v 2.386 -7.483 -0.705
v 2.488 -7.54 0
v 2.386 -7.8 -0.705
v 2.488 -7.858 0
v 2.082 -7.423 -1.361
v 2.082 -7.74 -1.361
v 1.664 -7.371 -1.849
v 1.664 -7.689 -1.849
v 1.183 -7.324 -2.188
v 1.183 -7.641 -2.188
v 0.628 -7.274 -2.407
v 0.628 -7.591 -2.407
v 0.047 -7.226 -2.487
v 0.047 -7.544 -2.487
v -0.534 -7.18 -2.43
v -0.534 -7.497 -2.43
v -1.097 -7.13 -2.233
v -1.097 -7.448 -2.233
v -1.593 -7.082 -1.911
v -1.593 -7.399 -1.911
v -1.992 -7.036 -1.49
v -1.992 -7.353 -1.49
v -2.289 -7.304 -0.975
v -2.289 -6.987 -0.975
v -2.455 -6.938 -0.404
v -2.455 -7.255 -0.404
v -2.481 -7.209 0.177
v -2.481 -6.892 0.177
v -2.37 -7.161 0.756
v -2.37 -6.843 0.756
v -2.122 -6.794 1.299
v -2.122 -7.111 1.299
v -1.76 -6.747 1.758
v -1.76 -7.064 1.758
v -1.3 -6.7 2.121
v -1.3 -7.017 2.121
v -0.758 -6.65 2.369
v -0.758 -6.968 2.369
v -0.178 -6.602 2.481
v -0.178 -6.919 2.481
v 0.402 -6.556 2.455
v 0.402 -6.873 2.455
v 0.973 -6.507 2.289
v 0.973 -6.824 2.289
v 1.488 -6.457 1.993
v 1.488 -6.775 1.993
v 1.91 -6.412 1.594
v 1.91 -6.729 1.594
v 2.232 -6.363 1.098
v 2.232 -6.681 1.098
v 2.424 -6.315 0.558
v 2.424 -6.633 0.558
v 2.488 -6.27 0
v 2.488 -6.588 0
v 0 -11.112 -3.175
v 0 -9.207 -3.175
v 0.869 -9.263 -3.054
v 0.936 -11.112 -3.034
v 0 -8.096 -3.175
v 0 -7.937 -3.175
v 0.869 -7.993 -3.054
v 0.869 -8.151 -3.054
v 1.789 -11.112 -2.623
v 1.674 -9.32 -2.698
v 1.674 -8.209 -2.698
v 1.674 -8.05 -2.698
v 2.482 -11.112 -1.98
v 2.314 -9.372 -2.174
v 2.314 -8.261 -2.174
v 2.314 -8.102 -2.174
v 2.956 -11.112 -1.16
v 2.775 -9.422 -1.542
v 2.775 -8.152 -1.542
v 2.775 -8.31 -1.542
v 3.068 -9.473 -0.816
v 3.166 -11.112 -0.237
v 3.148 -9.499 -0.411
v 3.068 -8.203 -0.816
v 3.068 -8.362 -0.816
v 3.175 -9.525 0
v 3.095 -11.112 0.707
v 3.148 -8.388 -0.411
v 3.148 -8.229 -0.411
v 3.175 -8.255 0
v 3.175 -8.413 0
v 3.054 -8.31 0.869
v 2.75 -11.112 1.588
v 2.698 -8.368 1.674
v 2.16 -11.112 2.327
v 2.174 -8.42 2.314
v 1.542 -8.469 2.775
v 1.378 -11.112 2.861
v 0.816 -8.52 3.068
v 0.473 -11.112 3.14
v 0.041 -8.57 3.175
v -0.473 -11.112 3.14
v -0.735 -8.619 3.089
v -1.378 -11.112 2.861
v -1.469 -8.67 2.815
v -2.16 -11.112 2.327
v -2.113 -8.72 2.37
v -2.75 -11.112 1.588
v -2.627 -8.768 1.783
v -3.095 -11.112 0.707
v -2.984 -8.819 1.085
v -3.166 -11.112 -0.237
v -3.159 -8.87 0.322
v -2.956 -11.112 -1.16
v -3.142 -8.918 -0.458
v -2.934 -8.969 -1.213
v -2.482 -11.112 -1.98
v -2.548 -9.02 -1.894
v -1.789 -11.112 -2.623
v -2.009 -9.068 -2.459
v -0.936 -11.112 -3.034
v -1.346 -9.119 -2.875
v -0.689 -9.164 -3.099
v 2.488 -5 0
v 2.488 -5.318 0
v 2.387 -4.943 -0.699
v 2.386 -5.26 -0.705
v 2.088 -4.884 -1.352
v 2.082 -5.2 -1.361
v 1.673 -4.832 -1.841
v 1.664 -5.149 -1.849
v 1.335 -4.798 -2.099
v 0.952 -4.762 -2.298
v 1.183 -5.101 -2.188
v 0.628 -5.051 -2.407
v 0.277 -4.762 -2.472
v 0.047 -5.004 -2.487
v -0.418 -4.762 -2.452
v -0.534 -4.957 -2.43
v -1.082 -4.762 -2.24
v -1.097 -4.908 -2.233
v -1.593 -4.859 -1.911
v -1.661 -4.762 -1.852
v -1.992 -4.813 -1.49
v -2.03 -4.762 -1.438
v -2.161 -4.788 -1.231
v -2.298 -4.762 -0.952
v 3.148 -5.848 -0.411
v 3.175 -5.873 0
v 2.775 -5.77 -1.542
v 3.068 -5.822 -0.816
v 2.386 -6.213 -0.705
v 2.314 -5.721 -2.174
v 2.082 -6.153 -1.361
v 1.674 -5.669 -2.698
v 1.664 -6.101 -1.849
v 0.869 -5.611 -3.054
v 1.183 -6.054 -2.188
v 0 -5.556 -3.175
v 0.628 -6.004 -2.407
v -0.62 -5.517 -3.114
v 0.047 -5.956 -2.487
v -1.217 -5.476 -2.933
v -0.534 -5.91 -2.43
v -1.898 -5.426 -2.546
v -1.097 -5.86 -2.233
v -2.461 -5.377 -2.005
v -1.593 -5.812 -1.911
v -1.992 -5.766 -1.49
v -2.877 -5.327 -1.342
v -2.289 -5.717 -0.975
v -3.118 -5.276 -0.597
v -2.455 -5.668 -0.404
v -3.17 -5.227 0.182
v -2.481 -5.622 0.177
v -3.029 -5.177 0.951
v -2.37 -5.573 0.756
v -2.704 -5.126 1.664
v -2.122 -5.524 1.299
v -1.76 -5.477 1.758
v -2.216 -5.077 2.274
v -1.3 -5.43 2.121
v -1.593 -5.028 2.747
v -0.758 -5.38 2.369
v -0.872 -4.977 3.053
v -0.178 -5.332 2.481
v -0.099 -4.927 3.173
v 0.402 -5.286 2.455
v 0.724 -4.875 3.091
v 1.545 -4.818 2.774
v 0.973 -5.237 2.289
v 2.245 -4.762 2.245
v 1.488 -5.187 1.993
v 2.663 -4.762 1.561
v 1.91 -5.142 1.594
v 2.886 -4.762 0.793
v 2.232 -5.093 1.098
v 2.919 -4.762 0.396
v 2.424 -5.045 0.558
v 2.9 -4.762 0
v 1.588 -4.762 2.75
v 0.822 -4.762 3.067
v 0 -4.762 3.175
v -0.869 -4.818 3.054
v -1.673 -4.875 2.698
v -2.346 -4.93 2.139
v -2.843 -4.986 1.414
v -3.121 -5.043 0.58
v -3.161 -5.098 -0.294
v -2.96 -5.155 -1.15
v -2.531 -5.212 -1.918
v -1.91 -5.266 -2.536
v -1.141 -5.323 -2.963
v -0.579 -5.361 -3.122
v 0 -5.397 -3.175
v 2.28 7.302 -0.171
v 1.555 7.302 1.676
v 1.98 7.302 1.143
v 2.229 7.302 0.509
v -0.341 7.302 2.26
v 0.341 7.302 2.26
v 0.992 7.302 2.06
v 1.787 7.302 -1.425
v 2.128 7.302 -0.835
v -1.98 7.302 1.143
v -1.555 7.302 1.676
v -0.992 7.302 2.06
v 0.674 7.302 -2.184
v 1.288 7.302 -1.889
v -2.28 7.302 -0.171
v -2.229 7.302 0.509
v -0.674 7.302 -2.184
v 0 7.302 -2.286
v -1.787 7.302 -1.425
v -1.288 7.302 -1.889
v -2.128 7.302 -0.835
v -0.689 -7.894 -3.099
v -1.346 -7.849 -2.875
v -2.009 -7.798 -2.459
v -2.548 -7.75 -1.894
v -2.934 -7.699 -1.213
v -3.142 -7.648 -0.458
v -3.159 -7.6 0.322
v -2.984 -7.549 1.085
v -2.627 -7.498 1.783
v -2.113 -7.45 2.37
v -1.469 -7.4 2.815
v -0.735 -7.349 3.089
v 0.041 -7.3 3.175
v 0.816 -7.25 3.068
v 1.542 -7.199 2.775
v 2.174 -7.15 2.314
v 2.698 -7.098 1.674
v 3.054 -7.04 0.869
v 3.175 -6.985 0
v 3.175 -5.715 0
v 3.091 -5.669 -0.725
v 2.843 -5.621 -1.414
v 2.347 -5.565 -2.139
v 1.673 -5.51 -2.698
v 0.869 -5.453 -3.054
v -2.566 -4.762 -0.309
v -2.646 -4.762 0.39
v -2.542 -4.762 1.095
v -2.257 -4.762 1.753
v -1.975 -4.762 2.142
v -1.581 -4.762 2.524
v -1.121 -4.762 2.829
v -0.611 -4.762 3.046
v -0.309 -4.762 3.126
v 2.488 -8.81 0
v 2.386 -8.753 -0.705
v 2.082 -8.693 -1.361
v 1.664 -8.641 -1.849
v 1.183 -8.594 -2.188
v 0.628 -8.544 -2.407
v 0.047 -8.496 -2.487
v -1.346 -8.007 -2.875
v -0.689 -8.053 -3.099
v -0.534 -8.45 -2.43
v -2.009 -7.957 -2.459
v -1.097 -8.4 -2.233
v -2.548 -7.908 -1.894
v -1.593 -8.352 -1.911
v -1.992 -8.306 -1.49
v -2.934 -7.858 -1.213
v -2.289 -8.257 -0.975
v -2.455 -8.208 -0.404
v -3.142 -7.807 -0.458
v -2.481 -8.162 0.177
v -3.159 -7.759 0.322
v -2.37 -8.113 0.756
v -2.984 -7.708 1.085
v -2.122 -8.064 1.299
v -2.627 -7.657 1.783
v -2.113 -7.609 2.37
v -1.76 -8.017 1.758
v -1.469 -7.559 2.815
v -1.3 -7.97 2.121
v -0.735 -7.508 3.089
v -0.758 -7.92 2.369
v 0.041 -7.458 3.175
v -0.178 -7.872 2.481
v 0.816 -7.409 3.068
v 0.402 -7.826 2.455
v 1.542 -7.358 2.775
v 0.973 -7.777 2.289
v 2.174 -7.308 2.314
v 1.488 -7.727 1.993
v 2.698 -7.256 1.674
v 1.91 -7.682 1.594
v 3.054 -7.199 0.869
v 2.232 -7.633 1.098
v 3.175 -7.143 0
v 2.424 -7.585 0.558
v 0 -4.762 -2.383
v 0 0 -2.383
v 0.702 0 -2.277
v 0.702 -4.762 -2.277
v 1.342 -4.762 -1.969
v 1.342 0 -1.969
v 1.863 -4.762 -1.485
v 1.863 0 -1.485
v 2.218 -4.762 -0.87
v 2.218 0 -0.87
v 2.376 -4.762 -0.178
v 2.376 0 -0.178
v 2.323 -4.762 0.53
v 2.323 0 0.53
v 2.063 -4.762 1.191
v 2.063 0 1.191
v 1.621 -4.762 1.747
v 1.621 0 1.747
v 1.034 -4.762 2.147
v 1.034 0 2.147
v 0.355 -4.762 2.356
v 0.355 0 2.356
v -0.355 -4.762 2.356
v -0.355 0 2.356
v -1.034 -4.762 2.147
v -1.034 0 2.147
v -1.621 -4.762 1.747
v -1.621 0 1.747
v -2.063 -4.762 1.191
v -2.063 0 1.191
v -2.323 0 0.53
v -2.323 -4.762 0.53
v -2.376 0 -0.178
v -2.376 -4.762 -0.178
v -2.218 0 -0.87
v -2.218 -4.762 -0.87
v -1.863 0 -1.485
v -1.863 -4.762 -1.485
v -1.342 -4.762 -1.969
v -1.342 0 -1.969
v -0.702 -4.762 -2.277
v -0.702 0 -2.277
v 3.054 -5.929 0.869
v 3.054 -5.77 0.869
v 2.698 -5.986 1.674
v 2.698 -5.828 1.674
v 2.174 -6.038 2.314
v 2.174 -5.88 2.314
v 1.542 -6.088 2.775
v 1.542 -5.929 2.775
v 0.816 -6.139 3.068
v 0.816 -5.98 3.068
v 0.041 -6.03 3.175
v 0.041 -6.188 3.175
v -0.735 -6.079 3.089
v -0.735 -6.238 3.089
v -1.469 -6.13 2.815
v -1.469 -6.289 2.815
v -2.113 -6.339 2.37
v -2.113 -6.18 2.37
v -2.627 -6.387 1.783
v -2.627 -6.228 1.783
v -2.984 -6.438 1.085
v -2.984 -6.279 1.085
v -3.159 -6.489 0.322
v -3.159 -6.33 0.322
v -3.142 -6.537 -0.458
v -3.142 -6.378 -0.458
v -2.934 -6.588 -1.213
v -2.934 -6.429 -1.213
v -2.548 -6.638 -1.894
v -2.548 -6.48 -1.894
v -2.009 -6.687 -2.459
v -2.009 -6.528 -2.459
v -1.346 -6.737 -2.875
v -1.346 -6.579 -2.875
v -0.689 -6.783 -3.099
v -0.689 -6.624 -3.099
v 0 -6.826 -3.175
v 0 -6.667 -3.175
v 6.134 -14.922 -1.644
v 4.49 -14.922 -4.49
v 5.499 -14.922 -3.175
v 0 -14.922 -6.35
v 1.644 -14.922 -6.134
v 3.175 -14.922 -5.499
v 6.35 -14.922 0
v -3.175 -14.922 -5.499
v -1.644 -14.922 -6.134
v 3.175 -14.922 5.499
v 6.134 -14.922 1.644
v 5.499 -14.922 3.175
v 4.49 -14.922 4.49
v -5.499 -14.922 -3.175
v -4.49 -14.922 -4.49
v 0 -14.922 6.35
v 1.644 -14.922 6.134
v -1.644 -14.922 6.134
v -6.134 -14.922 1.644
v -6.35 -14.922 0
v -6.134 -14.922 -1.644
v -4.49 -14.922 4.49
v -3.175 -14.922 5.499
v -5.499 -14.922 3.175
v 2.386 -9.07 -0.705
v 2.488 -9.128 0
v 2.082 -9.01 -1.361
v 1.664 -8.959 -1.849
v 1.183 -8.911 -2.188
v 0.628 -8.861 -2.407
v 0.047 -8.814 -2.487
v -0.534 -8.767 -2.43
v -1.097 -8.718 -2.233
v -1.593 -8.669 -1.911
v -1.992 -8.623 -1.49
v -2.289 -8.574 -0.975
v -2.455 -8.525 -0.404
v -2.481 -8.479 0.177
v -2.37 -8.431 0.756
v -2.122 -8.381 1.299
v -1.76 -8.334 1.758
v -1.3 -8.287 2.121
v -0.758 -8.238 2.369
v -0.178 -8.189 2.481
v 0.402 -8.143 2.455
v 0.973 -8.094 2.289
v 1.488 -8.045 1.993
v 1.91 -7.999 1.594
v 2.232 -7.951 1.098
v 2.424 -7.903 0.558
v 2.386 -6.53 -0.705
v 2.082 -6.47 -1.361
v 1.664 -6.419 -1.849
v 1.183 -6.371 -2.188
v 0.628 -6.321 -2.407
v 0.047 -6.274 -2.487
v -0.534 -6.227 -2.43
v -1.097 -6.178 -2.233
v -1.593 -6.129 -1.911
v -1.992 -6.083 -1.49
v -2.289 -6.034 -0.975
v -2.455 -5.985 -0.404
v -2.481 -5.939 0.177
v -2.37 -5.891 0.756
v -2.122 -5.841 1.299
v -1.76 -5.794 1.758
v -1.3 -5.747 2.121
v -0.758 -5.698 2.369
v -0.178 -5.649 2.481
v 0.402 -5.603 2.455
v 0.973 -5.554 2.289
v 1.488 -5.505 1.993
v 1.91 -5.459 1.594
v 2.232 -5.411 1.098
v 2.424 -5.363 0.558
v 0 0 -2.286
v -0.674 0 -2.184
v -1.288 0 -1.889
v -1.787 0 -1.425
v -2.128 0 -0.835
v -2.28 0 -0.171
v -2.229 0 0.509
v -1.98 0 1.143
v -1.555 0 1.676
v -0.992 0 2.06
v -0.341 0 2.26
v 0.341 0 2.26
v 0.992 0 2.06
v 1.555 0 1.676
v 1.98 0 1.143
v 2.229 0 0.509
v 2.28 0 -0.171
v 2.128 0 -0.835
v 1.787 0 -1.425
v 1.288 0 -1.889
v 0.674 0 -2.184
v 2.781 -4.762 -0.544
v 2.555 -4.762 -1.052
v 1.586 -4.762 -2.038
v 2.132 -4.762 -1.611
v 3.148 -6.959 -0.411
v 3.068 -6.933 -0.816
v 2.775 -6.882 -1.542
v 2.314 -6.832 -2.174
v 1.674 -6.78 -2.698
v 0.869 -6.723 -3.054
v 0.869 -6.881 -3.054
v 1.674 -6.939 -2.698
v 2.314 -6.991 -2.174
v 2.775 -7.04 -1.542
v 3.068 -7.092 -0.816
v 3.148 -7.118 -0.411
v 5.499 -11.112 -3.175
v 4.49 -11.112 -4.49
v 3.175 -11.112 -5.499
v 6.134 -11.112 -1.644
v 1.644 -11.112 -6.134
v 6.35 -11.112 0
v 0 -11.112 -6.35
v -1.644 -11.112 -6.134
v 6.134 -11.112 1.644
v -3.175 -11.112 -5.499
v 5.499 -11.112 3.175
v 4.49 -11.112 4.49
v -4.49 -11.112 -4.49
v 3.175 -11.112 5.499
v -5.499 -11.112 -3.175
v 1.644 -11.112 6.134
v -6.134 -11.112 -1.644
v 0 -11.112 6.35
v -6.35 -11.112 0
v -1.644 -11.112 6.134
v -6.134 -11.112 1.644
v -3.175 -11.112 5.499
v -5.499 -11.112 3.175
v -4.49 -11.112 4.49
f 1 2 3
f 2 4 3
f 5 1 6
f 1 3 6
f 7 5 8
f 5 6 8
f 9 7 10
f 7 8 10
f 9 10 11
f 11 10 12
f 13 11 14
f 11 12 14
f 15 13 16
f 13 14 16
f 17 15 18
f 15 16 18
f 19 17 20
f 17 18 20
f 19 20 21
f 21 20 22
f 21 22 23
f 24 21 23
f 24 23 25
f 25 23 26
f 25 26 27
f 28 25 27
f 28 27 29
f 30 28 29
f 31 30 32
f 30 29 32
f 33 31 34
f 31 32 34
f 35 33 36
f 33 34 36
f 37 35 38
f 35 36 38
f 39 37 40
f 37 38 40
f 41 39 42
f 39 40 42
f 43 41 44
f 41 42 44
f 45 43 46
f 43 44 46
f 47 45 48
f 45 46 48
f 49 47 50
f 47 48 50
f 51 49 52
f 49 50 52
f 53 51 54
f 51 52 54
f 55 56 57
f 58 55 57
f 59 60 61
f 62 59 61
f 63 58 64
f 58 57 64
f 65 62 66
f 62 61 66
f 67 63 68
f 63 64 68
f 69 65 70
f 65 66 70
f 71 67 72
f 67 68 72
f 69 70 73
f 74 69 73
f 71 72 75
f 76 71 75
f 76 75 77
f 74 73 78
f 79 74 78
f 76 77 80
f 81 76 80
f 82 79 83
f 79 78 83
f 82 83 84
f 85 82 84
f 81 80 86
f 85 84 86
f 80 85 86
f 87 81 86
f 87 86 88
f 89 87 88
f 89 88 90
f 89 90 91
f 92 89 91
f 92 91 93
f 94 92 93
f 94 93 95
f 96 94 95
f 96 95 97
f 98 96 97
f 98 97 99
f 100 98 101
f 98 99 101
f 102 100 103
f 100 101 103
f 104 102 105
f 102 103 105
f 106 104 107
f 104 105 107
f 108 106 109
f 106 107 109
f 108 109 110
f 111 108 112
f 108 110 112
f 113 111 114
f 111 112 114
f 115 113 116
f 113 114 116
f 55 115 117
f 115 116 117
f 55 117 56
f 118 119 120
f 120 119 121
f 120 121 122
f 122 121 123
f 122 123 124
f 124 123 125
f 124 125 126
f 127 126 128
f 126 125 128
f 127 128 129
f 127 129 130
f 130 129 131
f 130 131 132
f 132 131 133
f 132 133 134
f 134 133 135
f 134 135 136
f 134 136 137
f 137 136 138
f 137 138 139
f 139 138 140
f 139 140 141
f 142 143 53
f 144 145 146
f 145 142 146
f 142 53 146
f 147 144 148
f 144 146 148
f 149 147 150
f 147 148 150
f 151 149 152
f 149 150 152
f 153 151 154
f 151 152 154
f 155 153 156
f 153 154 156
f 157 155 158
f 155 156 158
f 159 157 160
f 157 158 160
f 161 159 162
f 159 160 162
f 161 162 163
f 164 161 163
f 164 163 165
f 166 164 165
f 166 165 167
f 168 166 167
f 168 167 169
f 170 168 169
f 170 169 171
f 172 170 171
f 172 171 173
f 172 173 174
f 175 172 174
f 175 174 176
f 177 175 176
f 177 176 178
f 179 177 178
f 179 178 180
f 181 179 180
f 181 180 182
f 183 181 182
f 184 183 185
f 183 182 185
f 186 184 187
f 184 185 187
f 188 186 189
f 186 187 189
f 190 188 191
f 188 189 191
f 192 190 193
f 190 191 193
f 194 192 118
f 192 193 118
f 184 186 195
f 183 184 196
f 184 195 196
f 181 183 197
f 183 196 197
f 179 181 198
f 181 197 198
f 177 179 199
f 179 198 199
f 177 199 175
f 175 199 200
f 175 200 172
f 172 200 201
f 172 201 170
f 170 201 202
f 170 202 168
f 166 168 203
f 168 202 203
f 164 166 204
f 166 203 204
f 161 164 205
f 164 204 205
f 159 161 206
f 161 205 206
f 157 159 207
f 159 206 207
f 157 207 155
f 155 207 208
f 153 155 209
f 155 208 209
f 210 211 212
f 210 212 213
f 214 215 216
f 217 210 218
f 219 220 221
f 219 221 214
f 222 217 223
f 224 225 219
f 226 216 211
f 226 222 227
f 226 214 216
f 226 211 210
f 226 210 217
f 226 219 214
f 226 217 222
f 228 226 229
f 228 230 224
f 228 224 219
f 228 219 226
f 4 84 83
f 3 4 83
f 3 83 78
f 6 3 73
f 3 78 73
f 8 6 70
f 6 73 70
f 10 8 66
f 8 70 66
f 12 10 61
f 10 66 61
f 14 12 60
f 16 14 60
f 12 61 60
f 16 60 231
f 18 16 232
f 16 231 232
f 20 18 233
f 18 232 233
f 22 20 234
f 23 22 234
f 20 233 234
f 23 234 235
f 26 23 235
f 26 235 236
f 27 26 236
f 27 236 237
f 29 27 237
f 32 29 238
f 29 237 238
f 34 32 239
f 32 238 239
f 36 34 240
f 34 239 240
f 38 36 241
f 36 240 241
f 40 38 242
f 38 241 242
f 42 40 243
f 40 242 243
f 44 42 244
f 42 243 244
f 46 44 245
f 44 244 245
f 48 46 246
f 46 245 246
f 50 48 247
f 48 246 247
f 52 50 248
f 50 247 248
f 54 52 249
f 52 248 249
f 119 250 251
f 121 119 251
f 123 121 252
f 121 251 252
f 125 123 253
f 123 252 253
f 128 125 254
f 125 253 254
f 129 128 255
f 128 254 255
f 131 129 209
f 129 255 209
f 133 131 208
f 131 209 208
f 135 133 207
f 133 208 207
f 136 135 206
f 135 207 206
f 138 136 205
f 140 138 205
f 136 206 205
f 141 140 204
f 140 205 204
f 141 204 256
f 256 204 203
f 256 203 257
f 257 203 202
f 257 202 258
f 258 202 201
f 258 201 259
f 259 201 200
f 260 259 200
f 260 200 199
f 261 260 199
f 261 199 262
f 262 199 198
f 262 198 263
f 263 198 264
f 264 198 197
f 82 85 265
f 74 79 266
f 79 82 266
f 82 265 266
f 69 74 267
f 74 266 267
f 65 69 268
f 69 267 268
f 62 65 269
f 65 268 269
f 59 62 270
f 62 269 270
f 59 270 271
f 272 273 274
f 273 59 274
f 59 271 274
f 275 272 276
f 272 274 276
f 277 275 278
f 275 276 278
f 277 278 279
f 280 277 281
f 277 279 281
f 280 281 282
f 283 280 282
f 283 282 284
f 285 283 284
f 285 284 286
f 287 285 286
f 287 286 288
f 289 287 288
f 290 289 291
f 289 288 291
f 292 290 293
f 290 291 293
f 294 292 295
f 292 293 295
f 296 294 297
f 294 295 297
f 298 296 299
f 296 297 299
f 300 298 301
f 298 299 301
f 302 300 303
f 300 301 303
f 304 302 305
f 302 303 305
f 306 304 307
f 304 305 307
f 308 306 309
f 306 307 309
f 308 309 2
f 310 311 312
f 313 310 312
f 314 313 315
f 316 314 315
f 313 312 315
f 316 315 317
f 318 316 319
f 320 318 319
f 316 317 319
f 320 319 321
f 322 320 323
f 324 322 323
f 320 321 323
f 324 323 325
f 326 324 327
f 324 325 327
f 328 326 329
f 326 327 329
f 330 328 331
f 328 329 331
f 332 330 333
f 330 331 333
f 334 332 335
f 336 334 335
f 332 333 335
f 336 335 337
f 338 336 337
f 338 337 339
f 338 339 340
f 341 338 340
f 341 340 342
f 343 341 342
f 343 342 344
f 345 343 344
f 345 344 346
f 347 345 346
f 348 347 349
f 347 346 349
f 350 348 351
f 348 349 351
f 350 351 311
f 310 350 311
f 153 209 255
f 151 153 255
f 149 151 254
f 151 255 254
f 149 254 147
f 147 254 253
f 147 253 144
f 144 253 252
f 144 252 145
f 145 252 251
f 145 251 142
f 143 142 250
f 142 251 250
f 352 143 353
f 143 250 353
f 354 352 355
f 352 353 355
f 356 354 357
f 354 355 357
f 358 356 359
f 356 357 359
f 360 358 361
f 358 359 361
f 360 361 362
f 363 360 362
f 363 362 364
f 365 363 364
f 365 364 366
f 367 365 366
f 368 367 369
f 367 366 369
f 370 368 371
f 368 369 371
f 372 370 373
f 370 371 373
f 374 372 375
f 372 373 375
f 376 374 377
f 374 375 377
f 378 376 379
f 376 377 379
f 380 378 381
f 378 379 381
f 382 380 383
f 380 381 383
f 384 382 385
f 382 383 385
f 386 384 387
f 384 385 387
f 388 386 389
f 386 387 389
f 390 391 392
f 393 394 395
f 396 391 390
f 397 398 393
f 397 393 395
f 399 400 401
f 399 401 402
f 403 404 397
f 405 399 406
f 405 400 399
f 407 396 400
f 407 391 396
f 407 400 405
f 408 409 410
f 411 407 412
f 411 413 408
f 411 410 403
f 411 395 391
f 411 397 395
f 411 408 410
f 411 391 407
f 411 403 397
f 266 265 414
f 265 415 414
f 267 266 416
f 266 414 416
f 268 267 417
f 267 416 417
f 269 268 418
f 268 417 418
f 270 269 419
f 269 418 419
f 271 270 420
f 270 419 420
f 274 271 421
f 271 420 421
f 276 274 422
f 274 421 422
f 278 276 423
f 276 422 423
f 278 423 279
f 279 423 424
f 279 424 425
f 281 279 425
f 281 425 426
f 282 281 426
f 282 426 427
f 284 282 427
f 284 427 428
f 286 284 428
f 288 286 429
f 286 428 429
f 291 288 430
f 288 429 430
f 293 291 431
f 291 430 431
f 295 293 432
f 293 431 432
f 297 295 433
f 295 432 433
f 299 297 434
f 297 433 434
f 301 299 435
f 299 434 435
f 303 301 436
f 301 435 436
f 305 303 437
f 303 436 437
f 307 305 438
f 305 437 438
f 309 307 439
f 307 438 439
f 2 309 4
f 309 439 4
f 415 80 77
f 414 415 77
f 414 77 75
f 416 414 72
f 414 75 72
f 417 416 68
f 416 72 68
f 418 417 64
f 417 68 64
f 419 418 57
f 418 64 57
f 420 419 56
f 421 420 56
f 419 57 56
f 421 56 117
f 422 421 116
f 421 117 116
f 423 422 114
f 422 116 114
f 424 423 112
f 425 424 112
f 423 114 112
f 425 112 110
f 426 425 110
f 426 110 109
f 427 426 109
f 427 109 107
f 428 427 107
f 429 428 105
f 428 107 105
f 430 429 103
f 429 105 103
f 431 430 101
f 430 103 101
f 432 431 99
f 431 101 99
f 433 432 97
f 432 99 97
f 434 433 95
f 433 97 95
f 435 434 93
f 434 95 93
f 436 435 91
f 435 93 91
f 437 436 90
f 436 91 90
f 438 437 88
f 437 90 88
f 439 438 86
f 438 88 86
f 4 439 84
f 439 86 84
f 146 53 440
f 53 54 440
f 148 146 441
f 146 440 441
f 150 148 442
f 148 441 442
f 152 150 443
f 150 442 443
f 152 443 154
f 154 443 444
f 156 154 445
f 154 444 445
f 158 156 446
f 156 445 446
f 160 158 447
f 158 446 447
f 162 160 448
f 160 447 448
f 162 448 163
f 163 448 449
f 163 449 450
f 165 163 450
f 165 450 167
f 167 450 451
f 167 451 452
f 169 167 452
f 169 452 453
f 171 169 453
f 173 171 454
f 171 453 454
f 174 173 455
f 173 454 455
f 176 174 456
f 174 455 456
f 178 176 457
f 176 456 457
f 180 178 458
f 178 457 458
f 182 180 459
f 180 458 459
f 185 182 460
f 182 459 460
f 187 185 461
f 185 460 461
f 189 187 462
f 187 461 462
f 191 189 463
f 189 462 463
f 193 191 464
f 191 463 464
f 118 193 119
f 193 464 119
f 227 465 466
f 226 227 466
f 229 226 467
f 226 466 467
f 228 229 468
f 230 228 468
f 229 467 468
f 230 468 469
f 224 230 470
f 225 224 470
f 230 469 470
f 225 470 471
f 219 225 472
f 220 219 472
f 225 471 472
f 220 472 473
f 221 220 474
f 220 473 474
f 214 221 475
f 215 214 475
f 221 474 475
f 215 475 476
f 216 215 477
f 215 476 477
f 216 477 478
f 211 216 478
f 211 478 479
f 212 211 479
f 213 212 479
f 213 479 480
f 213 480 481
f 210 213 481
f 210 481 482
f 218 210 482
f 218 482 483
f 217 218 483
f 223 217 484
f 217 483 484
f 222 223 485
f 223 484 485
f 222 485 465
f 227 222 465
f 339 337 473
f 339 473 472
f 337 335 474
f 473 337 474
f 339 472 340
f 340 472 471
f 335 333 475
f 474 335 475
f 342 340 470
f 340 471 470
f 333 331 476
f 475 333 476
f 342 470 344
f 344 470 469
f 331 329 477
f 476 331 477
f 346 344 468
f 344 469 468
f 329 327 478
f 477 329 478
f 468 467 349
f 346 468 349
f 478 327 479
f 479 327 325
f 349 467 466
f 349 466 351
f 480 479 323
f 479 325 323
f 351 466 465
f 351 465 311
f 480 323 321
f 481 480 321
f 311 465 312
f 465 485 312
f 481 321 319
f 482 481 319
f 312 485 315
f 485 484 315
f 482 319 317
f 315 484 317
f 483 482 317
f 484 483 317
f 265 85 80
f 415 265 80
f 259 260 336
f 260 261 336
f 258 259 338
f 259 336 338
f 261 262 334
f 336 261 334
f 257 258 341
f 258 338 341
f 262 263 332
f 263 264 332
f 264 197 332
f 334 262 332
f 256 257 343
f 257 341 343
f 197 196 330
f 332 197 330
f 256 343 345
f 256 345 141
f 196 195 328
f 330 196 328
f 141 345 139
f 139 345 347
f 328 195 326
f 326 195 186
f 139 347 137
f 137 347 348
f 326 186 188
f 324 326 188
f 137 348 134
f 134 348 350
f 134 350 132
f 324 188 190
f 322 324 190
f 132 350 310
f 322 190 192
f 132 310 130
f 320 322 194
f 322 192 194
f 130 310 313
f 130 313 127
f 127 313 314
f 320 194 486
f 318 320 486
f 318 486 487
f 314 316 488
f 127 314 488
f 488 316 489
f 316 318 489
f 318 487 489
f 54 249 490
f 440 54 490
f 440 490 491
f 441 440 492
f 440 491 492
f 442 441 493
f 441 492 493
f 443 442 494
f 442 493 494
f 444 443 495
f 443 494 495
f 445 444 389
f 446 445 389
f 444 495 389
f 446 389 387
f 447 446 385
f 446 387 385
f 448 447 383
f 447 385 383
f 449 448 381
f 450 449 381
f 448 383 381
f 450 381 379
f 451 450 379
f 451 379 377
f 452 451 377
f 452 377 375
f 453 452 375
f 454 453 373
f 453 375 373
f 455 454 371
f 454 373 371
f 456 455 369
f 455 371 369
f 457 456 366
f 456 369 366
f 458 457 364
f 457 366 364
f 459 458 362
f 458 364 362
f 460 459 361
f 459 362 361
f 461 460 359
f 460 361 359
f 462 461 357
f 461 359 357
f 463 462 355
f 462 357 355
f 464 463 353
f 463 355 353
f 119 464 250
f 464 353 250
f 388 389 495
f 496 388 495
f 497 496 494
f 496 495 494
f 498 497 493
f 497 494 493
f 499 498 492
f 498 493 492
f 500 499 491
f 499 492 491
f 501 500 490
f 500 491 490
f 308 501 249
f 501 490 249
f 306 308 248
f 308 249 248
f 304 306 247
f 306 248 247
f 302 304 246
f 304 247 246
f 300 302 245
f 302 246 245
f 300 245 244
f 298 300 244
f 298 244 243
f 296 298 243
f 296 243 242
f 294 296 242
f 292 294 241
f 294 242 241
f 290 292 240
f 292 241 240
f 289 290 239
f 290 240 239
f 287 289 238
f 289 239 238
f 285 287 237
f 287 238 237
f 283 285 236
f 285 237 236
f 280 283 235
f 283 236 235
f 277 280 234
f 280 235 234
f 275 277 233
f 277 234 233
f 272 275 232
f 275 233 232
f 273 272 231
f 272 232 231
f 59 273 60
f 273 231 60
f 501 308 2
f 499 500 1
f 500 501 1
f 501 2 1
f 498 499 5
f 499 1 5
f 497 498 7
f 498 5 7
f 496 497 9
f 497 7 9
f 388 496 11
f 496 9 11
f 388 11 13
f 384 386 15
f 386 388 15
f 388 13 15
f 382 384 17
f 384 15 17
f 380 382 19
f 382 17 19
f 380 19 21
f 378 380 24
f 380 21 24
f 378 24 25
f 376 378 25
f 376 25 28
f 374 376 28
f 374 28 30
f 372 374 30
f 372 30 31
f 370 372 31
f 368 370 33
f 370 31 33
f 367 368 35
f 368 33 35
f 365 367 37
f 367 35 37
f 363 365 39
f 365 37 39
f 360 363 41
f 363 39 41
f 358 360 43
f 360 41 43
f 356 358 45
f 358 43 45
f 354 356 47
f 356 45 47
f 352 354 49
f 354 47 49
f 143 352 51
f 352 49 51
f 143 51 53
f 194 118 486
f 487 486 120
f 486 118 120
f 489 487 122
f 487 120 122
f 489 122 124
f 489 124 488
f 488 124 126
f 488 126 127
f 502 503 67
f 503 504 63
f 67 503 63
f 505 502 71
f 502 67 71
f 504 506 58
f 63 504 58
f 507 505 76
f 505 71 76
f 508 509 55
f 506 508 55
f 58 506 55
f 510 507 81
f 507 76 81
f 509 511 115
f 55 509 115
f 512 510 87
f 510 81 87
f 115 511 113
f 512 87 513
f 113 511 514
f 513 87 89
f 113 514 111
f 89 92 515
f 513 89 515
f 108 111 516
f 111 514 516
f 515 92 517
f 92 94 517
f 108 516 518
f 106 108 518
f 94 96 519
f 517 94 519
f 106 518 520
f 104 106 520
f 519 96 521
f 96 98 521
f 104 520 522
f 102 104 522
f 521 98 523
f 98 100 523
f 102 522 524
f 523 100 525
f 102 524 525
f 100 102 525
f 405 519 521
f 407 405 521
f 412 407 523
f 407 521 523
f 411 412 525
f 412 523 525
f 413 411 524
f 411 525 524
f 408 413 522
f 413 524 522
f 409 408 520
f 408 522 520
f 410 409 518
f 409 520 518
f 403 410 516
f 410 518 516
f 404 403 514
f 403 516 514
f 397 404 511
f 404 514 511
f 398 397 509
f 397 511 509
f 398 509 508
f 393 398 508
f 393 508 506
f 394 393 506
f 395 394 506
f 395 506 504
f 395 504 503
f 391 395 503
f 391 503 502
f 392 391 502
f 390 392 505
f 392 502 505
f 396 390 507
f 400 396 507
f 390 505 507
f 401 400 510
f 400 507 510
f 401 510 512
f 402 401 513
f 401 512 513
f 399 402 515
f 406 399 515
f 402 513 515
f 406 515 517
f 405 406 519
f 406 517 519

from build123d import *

# Parameters (mm, degrees)
SKETCH1_R           = 2.286
BOSS_EXTRUDE1_DEPTH = 7.3025
SKETCH2_R           = 2.38252
BOSS_EXTRUDE2_DEPTH = 4.762246
SKETCH3_R           = 3.175
BOSS_EXTRUDE3_DEPTH = 3.175
SKETCH4_R           = 3.175
BOSS_EXTRUDE4_DEPTH = 3.175
THREAD2_PITCH       = 1.27
SKETCH11_R          = 6.35
BOSS_EXTRUDE5_DEPTH = 3.81


with BuildPart() as part:
    # Sketch1 → Boss-Extrude1 (new body)
    with BuildSketch(Plane(origin=(0, 0, 0), x_dir=(1, 0, 0), z_dir=(0, 1, 0))):
        with Locations(Location((0, 0, 0), (0, 0, 90))):
            Circle(SKETCH1_R)
    extrude(amount=BOSS_EXTRUDE1_DEPTH)

    # Sketch2 → Boss-Extrude2 (add)
    with BuildSketch(Plane(origin=(0, 0, 0), x_dir=(-1, 0, 0), z_dir=(0, -1, 0))):
        with Locations(Location((0, 0, 0), (0, 0, 90))):
            Circle(SKETCH2_R)
    extrude(amount=BOSS_EXTRUDE2_DEPTH)

    # Sketch3 → Boss-Extrude3 (add)
    with BuildSketch(Plane(origin=(0, -4.762246, 0), x_dir=(-1, 0, 0), z_dir=(0, -1, 0))):
        with Locations(Location((0, 0, 0), (0, 0, 90))):
            Circle(SKETCH3_R)
    extrude(amount=BOSS_EXTRUDE3_DEPTH)

    # Sketch4 → Boss-Extrude4 (add)
    with BuildSketch(Plane(origin=(0, -7.937246, 0), x_dir=(-1, 0, 0), z_dir=(0, -1, 0))):
        with Locations(Location((0, 0, 0), (0, 0, 90))):
            Circle(SKETCH4_R)
    extrude(amount=BOSS_EXTRUDE4_DEPTH)

    # Thread2: the profile of Thread Profile3 profile screwed along a right-hand helix of 3.75 turns, 8 arcs to a turn; built about Z, then put on its axis
    thread2_z = Axis((0, 0, 0), (0, 0, 1))
    thread2_corners = [(3.1753, 0, -0.000173205), (3.1753, 0, 1.111423202), (2.487592339, 0, 0.714374998), (2.487592339, 0, 0.396874998)]
    with BuildLine(mode=Mode.PRIVATE) as thread2_profile:
        Line(thread2_corners[0], thread2_corners[1])
        Line(thread2_corners[1], thread2_corners[2])
        Line(thread2_corners[2], thread2_corners[3])
        Line(thread2_corners[3], thread2_corners[0])
    thread2_cap = Face(thread2_profile.wire())
    thread2_turn_angles = [0, 22.5, 45, 67.5, 90, 112.5, 135, 157.5, 180, 202.5, 225, 247.5, 270, 292.5, 315, 337.5, 360]
    thread2_turn_weights = [1, 0.9238795325112867, 1, 0.9238795325112867, 1, 0.9238795325112867, 1, 0.9238795325112867, 1, 0.9238795325112867, 1, 0.9238795325112867, 1, 0.9238795325112867, 1, 0.9238795325112867, 1]
    thread2_turn_rails = [Edge.make_bspline([Vector(p[0], p[1], 0).rotate(thread2_z, thread2_turn_angles[k]) / thread2_turn_weights[k] + Vector(0, 0, p[2] + THREAD2_PITCH * thread2_turn_angles[k] / 360) for k in range(17)], [0, 0, 0, 1, 1, 2, 2, 3, 3, 4, 4, 5, 5, 6, 6, 7, 7, 8, 8, 8], 2, thread2_turn_weights) for p in thread2_corners]
    thread2_turn_sides = [Face.make_surface_from_curves(thread2_turn_rails[p[0]], thread2_turn_rails[p[1]]) for p in [(0, 1), (1, 2), (2, 3), (3, 0)]]
    thread2_last_angles = [1080, 1102.5, 1125, 1147.5, 1170, 1192.5, 1215, 1237.5, 1260, 1282.5, 1305, 1327.5, 1350]
    thread2_last_weights = [1, 0.9238795325112867, 1, 0.9238795325112867, 1, 0.9238795325112867, 1, 0.9238795325112867, 1, 0.9238795325112867, 1, 0.9238795325112883, 1]
    thread2_last_rails = [Edge.make_bspline([Vector(p[0], p[1], 0).rotate(thread2_z, thread2_last_angles[k]) / thread2_last_weights[k] + Vector(0, 0, p[2] + THREAD2_PITCH * thread2_last_angles[k] / 360) for k in range(13)], [0, 0, 0, 1, 1, 2, 2, 3, 3, 4, 4, 5, 5, 6, 6, 6], 2, thread2_last_weights) for p in thread2_corners]
    thread2_last_sides = [Face.make_surface_from_curves(thread2_last_rails[p[0]], thread2_last_rails[p[1]]) for p in [(0, 1), (1, 2), (2, 3), (3, 0)]]
    thread2 = Plane(origin=(0, -9.524746, 0), x_dir=(1, 0, 0), z_dir=(0, 1, 0)) * Solid(Shell([*[p.moved(Location((0, 0, THREAD2_PITCH * i))) for i in range(3) for p in thread2_turn_sides], *thread2_last_sides, thread2_cap, thread2_cap.rotate(thread2_z, 1350).moved(Location((0, 0, THREAD2_PITCH * 1350 / 360)))]))
    add(thread2, mode=Mode.SUBTRACT)

    # Sketch11 → Boss-Extrude5 (add)
    with BuildSketch(Plane(origin=(0, -11.112246, 0), x_dir=(-1, 0, 0), z_dir=(0, -1, 0))):
        with Locations(Location((0, 0, 0), (0, 0, 270))):
            Circle(SKETCH11_R)
    extrude(amount=BOSS_EXTRUDE5_DEPTH)


solid = part.part
